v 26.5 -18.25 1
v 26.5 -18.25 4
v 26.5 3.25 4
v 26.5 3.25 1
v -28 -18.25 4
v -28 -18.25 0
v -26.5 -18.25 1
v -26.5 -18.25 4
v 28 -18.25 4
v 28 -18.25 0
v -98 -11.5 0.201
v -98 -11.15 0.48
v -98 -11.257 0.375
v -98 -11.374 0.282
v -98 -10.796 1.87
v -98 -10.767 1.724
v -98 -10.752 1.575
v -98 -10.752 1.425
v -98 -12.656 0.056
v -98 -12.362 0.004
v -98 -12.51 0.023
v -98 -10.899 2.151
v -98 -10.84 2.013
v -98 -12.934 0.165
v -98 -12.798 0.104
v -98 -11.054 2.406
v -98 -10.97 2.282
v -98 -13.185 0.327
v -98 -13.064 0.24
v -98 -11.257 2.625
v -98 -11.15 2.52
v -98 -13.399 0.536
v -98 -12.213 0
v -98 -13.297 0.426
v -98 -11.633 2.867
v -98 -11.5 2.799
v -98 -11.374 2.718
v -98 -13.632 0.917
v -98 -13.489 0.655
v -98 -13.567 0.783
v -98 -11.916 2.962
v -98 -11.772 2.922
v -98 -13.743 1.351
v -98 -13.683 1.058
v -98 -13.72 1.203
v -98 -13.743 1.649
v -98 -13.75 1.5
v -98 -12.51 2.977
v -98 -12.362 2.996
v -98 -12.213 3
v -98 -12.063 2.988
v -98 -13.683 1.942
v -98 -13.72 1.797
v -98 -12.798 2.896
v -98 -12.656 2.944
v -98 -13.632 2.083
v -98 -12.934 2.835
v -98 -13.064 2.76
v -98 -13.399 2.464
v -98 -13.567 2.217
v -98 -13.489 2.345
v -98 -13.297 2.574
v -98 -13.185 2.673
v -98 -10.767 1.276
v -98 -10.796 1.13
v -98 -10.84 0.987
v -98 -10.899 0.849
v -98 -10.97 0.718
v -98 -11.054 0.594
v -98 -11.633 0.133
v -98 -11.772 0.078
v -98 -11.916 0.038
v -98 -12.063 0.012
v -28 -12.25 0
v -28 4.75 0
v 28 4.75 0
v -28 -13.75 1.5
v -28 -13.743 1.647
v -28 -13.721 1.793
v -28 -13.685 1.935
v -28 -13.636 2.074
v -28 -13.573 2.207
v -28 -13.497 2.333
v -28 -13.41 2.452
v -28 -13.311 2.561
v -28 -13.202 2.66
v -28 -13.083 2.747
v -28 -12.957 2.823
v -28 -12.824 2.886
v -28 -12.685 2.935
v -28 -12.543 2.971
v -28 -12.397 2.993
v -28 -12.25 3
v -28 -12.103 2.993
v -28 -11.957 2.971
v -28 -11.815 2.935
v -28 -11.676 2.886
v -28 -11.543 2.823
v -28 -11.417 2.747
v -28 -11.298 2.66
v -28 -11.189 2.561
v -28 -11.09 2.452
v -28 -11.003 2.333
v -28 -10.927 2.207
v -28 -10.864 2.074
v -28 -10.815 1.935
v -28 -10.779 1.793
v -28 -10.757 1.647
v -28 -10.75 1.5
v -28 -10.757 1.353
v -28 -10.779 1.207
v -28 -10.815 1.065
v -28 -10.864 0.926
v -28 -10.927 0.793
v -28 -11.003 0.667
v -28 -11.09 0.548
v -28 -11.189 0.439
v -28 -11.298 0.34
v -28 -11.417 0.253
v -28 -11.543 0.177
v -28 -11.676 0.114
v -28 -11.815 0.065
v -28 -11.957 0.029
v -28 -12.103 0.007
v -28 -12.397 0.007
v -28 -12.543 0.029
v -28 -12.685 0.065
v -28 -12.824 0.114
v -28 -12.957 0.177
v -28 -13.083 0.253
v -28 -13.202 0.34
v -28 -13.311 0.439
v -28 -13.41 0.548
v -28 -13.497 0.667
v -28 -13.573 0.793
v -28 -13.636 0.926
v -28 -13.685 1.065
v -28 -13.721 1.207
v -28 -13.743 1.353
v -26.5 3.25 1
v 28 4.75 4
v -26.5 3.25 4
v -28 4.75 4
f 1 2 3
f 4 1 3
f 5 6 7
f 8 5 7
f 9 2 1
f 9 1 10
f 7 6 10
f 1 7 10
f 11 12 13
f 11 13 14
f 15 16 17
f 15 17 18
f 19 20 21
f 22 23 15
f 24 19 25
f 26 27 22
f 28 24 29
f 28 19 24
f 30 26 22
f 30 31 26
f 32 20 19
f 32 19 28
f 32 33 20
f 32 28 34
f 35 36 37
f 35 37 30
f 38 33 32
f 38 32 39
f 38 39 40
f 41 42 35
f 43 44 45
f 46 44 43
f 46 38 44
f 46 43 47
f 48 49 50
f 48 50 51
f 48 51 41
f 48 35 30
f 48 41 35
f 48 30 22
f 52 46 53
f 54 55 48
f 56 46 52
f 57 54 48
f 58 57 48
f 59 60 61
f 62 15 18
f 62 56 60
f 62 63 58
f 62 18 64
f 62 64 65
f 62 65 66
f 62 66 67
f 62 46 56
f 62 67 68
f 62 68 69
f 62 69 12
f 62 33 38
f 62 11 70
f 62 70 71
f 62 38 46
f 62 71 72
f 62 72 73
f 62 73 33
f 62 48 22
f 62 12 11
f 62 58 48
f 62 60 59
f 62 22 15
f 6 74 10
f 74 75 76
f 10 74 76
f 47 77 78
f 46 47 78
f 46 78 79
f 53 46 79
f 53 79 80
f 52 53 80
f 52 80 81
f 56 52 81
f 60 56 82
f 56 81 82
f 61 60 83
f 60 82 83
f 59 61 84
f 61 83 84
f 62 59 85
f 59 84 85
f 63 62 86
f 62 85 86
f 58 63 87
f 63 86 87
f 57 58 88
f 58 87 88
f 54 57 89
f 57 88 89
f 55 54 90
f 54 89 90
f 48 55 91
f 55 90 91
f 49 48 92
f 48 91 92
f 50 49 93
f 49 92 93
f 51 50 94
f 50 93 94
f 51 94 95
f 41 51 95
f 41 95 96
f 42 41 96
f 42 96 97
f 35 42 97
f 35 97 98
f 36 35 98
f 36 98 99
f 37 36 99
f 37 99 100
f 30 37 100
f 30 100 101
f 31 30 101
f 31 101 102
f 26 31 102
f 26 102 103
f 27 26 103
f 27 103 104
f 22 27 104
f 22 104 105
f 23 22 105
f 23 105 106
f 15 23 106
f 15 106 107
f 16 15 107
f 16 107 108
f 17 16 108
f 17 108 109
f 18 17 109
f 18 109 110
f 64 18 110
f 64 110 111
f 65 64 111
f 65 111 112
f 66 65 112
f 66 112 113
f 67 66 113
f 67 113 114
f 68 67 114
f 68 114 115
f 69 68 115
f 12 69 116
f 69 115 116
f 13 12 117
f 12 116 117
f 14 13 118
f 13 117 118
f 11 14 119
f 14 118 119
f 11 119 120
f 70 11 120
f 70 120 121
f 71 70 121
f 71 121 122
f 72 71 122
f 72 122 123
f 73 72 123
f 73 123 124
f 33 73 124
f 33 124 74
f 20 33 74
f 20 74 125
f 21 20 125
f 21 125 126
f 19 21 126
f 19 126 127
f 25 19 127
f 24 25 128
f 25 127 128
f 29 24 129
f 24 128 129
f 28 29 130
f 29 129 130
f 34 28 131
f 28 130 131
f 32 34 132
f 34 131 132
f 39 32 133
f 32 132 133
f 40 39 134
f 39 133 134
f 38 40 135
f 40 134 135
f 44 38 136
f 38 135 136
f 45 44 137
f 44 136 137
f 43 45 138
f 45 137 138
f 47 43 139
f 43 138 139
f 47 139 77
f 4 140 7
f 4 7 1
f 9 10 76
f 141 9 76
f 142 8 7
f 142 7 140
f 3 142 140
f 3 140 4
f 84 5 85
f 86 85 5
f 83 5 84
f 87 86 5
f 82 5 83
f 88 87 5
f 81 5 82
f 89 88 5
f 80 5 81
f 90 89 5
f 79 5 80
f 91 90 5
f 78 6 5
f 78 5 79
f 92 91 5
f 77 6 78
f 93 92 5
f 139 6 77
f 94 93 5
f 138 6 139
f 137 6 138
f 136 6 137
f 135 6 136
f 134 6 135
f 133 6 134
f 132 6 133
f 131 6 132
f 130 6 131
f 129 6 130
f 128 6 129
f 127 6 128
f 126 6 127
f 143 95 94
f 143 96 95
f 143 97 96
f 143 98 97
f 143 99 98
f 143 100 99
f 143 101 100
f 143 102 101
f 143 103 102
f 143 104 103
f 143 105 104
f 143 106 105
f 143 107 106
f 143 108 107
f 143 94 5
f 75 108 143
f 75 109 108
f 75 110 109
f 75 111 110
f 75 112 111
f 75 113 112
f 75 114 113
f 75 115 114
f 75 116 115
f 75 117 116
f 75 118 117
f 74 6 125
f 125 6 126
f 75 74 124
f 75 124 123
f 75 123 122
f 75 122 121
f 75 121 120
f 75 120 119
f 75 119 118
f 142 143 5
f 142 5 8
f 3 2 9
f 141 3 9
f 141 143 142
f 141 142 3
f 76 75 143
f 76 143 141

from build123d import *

# Parameters (mm, degrees)
SKETCH007_W     = 56
SKETCH007_H     = 23
PAD004_DEPTH    = 4
SKETCH008_W     = 53
SKETCH008_H     = 25.379599
POCKET003_DEPTH = 3
SKETCH009_R     = 1.5
PAD005_DEPTH    = 70


with BuildPart() as part:
    # Sketch007 → Pad004 (new body)
    with BuildSketch(Plane.XY):
        Rectangle(SKETCH007_W, SKETCH007_H)
    extrude(amount=PAD004_DEPTH)

    # Sketch008 (on Face6 of Pad004) → Pocket003 (cut)
    with BuildSketch(Plane.XY.offset(4)):
        with Locations((0, -2.689799)):
            Rectangle(SKETCH008_W, SKETCH008_H)
    extrude(amount=-POCKET003_DEPTH, mode=Mode.SUBTRACT)

    # Sketch009 (on Face2 of Pocket003) → Pad005 (join)
    with BuildSketch(Plane(origin=(-28, 0, 0), x_dir=(0, -1, 0), z_dir=(-1, 0, 0))):
        with Locations((5.5, 1.5)):
            Circle(SKETCH009_R)
    extrude(amount=PAD005_DEPTH)


with BuildPart() as part_1:
    # Body002 placement: moved
    add(part.part.moved(Location((0, -6.75, 0))))


solid = part_1.part
